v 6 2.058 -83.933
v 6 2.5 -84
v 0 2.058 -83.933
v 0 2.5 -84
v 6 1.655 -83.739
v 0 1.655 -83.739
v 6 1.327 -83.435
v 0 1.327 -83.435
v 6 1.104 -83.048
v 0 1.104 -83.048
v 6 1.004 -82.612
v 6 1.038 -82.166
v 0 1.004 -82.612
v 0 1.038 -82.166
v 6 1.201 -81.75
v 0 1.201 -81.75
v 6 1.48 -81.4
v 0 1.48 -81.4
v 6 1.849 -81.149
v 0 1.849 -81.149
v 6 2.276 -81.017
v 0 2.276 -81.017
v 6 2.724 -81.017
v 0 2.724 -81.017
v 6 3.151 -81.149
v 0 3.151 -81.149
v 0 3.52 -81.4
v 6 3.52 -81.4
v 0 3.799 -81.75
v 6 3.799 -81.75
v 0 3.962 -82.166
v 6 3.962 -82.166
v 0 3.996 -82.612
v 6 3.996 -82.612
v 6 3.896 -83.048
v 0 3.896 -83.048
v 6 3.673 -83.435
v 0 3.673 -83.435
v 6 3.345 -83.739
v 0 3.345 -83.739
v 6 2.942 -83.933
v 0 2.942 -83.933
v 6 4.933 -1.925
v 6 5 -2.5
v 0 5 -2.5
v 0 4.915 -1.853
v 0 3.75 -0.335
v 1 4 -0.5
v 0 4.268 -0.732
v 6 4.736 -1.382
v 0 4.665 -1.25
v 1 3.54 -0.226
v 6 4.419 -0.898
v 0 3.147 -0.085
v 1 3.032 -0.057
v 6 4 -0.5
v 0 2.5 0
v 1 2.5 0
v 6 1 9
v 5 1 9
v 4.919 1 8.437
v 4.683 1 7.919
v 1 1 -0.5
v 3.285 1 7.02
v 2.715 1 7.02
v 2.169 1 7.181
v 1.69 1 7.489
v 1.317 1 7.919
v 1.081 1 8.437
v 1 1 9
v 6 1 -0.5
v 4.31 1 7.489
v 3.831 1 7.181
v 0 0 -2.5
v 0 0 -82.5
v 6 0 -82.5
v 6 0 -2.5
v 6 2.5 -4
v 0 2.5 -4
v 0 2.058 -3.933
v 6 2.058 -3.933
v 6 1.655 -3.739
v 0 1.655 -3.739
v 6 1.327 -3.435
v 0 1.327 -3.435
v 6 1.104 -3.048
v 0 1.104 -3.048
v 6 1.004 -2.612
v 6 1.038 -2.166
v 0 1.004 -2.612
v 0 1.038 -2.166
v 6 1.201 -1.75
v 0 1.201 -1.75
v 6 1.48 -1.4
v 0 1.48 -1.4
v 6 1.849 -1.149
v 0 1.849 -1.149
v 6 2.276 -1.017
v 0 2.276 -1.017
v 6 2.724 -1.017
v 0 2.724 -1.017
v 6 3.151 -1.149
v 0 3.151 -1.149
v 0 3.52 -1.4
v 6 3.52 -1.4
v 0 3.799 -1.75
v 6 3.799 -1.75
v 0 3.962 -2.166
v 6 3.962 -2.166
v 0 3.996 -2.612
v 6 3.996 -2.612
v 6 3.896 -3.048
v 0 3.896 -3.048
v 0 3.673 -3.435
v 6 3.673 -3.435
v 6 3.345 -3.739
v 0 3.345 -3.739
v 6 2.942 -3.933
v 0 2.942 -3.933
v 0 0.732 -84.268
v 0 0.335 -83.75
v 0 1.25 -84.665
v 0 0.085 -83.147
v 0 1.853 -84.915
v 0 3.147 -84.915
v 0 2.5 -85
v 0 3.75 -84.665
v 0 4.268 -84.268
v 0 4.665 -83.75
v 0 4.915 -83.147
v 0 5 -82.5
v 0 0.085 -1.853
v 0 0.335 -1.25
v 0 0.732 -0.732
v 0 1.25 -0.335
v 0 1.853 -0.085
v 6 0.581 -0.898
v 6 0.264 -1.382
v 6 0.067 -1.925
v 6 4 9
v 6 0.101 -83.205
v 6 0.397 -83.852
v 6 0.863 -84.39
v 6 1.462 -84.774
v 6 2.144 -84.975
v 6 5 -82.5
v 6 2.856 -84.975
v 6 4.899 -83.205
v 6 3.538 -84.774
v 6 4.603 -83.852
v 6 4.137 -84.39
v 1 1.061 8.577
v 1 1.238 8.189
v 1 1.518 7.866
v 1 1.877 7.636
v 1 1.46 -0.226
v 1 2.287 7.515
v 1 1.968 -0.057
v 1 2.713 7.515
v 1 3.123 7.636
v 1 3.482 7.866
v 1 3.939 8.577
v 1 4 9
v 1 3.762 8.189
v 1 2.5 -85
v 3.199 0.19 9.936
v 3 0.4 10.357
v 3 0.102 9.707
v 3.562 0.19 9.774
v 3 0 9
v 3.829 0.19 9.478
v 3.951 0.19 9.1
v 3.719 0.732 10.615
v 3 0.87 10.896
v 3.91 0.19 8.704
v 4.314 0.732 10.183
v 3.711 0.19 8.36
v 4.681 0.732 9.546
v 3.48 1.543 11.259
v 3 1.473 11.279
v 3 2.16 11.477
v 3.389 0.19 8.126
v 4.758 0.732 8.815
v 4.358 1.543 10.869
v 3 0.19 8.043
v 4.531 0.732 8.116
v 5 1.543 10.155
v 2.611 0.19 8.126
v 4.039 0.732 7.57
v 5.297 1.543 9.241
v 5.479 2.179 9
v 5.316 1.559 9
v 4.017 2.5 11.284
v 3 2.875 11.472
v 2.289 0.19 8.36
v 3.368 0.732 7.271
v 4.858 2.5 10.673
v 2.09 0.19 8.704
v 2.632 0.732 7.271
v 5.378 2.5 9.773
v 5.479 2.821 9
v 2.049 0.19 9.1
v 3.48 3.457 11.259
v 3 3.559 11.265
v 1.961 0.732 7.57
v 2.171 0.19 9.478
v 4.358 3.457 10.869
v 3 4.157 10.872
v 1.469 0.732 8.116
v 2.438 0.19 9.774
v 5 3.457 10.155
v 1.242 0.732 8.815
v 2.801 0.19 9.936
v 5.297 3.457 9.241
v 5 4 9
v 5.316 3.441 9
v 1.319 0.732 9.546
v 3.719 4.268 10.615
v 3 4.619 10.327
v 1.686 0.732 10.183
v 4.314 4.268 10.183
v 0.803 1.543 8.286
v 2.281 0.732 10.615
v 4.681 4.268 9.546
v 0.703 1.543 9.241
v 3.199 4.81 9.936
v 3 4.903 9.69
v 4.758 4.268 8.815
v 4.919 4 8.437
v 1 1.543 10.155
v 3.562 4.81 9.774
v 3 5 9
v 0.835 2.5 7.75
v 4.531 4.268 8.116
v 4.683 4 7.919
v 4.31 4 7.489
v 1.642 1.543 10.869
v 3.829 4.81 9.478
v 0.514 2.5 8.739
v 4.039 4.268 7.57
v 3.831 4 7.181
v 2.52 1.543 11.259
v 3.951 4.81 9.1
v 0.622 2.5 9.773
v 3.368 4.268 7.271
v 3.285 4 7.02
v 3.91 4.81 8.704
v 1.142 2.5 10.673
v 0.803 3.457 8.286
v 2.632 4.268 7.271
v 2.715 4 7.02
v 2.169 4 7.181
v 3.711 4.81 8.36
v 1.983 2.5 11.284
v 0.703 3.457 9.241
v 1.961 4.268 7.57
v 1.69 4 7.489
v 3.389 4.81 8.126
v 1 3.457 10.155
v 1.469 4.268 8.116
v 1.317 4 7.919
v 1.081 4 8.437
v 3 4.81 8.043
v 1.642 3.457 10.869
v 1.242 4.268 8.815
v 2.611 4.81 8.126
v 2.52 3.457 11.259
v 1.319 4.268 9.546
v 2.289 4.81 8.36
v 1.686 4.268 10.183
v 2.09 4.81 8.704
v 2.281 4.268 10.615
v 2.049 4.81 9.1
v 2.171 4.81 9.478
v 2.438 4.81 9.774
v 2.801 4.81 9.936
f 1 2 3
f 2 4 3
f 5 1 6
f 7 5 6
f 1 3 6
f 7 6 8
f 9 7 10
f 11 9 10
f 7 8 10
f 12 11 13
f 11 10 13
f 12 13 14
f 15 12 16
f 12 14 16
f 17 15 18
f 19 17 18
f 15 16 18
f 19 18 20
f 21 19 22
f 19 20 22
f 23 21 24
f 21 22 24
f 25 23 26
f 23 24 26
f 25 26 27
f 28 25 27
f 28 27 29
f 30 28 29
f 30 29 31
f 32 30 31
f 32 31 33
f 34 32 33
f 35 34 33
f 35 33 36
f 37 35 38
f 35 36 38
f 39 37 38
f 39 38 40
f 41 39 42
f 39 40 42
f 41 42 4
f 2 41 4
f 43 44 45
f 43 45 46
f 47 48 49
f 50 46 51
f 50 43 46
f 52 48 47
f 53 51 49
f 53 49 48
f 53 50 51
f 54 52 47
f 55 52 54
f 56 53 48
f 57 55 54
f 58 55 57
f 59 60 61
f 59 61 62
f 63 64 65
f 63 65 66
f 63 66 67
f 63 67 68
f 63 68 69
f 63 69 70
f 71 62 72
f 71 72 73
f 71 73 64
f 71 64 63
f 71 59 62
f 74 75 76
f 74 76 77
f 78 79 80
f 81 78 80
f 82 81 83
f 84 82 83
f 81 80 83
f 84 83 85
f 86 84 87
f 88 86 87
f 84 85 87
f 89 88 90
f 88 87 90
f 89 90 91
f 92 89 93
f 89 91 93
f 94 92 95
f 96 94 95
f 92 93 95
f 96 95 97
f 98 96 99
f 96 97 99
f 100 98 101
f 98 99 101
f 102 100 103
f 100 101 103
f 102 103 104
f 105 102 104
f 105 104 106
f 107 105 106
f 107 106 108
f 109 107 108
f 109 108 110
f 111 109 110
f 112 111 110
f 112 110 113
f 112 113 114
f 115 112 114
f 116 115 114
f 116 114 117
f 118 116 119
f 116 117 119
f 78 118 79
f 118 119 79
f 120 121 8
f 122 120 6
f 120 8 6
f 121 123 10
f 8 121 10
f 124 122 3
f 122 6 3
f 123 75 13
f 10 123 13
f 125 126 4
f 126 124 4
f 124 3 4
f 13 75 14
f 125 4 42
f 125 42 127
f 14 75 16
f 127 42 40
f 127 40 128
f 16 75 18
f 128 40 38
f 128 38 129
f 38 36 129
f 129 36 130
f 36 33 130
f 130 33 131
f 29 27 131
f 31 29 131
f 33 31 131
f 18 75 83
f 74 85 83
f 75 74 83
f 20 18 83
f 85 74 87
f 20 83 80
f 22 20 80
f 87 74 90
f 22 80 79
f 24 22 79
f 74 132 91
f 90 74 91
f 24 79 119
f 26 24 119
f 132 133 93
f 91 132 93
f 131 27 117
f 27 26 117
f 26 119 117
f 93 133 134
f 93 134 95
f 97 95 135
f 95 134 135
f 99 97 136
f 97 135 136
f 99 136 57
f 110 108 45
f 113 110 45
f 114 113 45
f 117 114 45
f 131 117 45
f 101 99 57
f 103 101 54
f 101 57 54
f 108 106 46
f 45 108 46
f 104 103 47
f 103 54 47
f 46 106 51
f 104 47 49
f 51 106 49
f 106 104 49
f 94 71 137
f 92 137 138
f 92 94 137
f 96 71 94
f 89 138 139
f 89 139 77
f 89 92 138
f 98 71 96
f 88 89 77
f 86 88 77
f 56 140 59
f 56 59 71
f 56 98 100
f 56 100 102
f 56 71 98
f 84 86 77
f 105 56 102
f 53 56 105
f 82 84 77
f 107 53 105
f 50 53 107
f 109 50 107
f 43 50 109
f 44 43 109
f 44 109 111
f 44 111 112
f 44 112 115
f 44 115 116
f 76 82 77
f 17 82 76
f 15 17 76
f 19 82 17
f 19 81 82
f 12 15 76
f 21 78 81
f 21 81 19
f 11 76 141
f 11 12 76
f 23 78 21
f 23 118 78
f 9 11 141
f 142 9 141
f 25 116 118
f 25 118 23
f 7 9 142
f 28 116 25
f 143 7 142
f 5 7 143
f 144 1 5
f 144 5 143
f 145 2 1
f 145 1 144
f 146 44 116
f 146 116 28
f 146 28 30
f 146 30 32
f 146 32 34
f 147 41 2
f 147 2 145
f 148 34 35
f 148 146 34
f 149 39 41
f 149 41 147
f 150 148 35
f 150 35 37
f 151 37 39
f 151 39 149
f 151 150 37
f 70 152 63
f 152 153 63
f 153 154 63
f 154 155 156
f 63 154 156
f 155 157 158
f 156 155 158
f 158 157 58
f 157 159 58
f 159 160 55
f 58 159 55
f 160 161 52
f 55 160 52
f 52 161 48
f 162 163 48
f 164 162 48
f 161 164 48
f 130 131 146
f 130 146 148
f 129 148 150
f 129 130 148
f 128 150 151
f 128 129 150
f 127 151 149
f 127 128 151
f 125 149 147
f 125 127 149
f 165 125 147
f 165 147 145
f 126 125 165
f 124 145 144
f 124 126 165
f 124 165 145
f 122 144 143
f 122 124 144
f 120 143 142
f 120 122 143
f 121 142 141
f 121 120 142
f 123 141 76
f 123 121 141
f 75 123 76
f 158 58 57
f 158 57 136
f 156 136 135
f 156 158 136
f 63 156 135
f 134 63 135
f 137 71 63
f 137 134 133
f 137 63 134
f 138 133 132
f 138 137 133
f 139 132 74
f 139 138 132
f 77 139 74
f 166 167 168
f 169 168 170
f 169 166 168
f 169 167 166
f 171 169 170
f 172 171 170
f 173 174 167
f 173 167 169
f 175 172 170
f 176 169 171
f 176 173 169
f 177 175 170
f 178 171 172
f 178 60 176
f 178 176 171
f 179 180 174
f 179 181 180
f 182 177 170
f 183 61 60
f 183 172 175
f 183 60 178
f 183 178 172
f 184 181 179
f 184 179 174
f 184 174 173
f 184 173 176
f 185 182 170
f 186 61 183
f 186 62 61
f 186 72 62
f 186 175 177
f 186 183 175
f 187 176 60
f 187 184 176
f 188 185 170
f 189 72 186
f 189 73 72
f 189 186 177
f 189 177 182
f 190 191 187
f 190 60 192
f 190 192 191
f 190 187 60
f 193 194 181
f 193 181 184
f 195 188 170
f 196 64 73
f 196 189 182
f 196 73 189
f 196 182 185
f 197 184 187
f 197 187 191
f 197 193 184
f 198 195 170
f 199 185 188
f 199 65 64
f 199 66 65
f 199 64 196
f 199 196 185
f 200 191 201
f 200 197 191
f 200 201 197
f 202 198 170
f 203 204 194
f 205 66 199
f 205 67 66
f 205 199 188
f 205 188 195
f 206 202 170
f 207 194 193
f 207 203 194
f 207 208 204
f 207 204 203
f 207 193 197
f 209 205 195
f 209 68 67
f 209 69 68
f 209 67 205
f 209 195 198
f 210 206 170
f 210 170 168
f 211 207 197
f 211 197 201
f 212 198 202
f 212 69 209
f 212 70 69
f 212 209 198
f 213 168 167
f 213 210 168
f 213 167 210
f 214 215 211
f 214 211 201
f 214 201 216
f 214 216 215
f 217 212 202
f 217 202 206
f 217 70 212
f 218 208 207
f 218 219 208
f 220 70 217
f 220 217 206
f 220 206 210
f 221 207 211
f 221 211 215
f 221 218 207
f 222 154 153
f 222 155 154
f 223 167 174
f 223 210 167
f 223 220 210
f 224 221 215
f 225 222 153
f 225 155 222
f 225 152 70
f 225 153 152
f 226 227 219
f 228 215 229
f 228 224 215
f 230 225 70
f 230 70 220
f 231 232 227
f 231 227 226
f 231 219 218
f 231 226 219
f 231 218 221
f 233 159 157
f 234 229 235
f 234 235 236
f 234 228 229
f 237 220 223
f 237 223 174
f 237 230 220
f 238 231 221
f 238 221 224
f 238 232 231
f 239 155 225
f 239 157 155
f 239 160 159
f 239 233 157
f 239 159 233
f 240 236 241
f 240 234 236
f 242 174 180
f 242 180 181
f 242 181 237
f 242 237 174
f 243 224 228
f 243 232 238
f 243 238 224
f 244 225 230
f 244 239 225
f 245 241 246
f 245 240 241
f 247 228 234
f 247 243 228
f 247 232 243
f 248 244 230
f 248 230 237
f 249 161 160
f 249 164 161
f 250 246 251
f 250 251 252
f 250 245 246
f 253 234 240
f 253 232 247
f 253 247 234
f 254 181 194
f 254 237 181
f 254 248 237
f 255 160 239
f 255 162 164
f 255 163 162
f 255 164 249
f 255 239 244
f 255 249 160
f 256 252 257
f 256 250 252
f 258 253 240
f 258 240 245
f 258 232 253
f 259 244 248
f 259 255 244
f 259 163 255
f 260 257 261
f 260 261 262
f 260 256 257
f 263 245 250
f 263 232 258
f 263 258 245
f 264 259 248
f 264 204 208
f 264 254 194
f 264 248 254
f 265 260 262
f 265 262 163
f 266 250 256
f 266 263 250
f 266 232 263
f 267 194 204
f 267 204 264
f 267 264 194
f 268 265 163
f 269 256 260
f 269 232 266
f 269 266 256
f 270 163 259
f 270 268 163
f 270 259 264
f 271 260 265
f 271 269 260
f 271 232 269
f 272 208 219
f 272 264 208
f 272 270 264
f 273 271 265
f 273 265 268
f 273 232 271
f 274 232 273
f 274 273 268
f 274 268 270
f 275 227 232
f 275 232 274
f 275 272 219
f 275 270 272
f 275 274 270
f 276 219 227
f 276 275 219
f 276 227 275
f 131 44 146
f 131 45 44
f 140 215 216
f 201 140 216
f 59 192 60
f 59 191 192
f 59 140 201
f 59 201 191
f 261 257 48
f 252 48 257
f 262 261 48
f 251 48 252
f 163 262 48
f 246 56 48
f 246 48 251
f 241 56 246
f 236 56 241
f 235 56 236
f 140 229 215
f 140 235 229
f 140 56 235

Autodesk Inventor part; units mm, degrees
sketch "草圖1" plane through (0, 0, 0) normal (1, 0, 0) x (0, 1, 0)
  line L0 (0, 0) -> (5, 0)
  line L1 (5, 0) -> (5, -85)
  line L2 (5, -85) -> (0, -85)
  line L3 (0, -85) -> (0, 0)
  dimension "d0" = 5
  dimension "d1" = 85
extrude "擠出1" add sketch "草圖1" along normal blind 6
fillet "圓角1" radius 2.5 2 edges at (3, 5, 0) (3, 0, 0)
hole "孔1" at (6, 2.5, -2.5) direction (-1, 0, 0) diameter 3 end through all
fillet "圓角2" radius 2.5 2 edges at (3, 5, -85) (3, 0, -85)
hole "孔2" at (6, 2.5, -82.5) direction (-1, 0, 0) diameter 3 end through all
sketch "草圖2" plane through (6, 0, 0) normal (1, 0, 0) x (0, 0, -1)
  line L0 (0, -1) -> (0, 6) projected
  line L1 (0, -1) -> (0, 6) projected
  line L2 (120, 0) -> (-20, 0) projected
  circle A0 centre (82.5, 2.5) radius 1.5 projected
  circle A1 centre (2.5, 2.5) radius 1.5 projected
  arc A2 (82.5, 0) -> (82.5, 5) centre (82.5, 2.5) ccw projected
  line L3 (82.5, 5) -> (2.5, 5) projected
  arc A3 (2.5, 5) -> (2.5, 0) centre (2.5, 2.5) ccw projected
  line L4 (2.5, 0) -> (82.5, 0) projected
  circle A4 centre (98.5, 2.5) radius 1.5
  circle A5 centre (82.5, 2.5) radius 1.5 projected
  line L5 (84.5, 4) -> (98.5, 4)
  line L6 (98.5, 4) -> (98.5, 1)
  line L7 (98.5, 1) -> (84.5, 1)
  point P0 (0, 0)
  dimension "d24" = 3
  dimension "d25" = 16
extrude "擠出2" add sketch "草圖2" against normal blind 5 contours A2 L5 A4 L7 | L6 A4 | A4 L6
ref_plane "工作平面1" through (3, 0, 0) normal (1, 0, 0) x (0, 0, -1)
sketch "草圖3" plane through (3, 0, 0) normal (1, 0, 0) x (0, 0, -1)
  arc A0 (98.5, 1) -> (98.5, 4) centre (98.5, 2.5) ccw projected
  line L0 (98.5, 1) -> (102.8586, 1)
  line L1 (102.8586, 1) -> (102.8586, 5.3685)
  line L2 (102.8586, 5.3685) -> (98.5, 5.3685)
  line L3 (98.5, 5.3685) -> (98.5, 1)
  point P0 (0, 0)
extrude "擠出3" cut sketch "草圖3" along normal mid plane 6
sketch "草圖4" plane through (3, 0, 0) normal (1, 0, 0) x (0, 0, -1)
  line L0 (98.5, 4) -> (98.5, 1) projected
  arc A0 (98.5, 0) -> (98.5, 5) centre (98.5, 2.5) ccw
  line L1 (98.5, 5) -> (98.5, 0)
  point P0 (0, 0)
  dimension "d30" = 5
revolve "迴轉1" add sketch "草圖4" angle 360 about axis through (3, 5, -98.5) along (0, -1, 0)
ref_plane "工作平面3" through (-79.3581, 2.5, -42.5) normal (0, 0, 1) x (1, 0, 0)
ref_plane "工作平面2" through (-79.3581, 2.5, -2.5) normal (0, 0, 1) x (1, 0, 0)
mirror "鏡射1" about plane through (-79.3581, 2.5, -42.5) normal (0, 0, 1) of "迴轉1", "擠出2", "擠出3"
sketch "草圖5" plane through (0, 0, 0) normal (-1, 0, 0) x (0, 0, 1)
  circle A0 centre (-82.5, 2.5) radius 1.5 projected
  arc A1 (-82.5, 5) -> (-82.5, 0) centre (-82.5, 2.5) ccw projected
  line L0 (-82.5, 0) -> (-2.5, 0) projected
  arc A2 (-2.5, 0) -> (-2.5, 5) centre (-2.5, 2.5) ccw projected
  line L1 (-2.5, 5) -> (-82.5, 5) projected
  circle A3 centre (-2.5, 2.5) radius 1.5 projected
  line L2 (-82.5, 0) -> (-111.7443, 0)
  line L3 (-111.7443, 0) -> (-111.7443, 9.7981)
  line L4 (-111.7443, 9.7981) -> (-82.5, 9.7981)
  line L5 (-82.5, 9.7981) -> (-82.5, 5)
  point P0 (0, 0)
extrude "擠出4" cut sketch "草圖5" against normal blind 68 contours A1 L2 L3 L4 L5
sketch "草圖6" plane through (6, 0, 0) normal (1, 0, 0) x (0, 0, -1)
  line L0 (-100.5, 5.0204) -> (-0.5, 5.0204)
  line L1 (-0.5, 5.0204) -> (-0.5, -3.8226)
  line L2 (-0.5, -3.8226) -> (-100.5, -3.8226)
  line L3 (-100.5, -3.8226) -> (-100.5, 5.0204)
  circle A0 centre (2.5, 2.5) radius 1.5 projected
  point P0 (0, 0)
  dimension "d36" = 100
  dimension "d37" = 3
extrude "擠出5" cut sketch "草圖6" against normal blind 30.5 contours L0 L1 L2 L3
sketch "草圖7" plane through (6, 0, 0) normal (1, 0, 0) x (0, 0, -1)
  line L0 (-0.5, 4) -> (-0.5, 1) projected
  line L1 (-0.5, 4) -> (-9, 4)
  line L2 (-9, 4) -> (-9, 1)
  line L3 (-9, 1) -> (-0.5, 1)
  line L4 (-0.5, 1) -> (-0.5, 4)
  point P0 (0, 0)
  dimension "d40" = 8.5
extrude "擠出6" add sketch "草圖7" against normal up to surface (5 mm away)
ref_plane "工作平面5" through (3, 0, 0) normal (-1, 0, 0) x (0, 0, 1)
sketch "草圖8" plane through (3, 0, 0) normal (-1, 0, 0) x (0, 0, 1)
  line L0 (9, 4) -> (9, 1) projected
  arc A0 (9, 0) -> (9, 5) centre (9, 2.5) ccw
  line L1 (9, 5) -> (9, 0)
  point P0 (0, 0)
  dimension "d43" = 5
revolve "迴轉2" add sketch "草圖8" angle 360 about axis through (3, 5, 9) along (0, -1, 0)
ref_plane "工作平面4" through (3, 0, -85) normal (-1, 0, 0) x (0, 0, 1)
properties part number "支架3"
